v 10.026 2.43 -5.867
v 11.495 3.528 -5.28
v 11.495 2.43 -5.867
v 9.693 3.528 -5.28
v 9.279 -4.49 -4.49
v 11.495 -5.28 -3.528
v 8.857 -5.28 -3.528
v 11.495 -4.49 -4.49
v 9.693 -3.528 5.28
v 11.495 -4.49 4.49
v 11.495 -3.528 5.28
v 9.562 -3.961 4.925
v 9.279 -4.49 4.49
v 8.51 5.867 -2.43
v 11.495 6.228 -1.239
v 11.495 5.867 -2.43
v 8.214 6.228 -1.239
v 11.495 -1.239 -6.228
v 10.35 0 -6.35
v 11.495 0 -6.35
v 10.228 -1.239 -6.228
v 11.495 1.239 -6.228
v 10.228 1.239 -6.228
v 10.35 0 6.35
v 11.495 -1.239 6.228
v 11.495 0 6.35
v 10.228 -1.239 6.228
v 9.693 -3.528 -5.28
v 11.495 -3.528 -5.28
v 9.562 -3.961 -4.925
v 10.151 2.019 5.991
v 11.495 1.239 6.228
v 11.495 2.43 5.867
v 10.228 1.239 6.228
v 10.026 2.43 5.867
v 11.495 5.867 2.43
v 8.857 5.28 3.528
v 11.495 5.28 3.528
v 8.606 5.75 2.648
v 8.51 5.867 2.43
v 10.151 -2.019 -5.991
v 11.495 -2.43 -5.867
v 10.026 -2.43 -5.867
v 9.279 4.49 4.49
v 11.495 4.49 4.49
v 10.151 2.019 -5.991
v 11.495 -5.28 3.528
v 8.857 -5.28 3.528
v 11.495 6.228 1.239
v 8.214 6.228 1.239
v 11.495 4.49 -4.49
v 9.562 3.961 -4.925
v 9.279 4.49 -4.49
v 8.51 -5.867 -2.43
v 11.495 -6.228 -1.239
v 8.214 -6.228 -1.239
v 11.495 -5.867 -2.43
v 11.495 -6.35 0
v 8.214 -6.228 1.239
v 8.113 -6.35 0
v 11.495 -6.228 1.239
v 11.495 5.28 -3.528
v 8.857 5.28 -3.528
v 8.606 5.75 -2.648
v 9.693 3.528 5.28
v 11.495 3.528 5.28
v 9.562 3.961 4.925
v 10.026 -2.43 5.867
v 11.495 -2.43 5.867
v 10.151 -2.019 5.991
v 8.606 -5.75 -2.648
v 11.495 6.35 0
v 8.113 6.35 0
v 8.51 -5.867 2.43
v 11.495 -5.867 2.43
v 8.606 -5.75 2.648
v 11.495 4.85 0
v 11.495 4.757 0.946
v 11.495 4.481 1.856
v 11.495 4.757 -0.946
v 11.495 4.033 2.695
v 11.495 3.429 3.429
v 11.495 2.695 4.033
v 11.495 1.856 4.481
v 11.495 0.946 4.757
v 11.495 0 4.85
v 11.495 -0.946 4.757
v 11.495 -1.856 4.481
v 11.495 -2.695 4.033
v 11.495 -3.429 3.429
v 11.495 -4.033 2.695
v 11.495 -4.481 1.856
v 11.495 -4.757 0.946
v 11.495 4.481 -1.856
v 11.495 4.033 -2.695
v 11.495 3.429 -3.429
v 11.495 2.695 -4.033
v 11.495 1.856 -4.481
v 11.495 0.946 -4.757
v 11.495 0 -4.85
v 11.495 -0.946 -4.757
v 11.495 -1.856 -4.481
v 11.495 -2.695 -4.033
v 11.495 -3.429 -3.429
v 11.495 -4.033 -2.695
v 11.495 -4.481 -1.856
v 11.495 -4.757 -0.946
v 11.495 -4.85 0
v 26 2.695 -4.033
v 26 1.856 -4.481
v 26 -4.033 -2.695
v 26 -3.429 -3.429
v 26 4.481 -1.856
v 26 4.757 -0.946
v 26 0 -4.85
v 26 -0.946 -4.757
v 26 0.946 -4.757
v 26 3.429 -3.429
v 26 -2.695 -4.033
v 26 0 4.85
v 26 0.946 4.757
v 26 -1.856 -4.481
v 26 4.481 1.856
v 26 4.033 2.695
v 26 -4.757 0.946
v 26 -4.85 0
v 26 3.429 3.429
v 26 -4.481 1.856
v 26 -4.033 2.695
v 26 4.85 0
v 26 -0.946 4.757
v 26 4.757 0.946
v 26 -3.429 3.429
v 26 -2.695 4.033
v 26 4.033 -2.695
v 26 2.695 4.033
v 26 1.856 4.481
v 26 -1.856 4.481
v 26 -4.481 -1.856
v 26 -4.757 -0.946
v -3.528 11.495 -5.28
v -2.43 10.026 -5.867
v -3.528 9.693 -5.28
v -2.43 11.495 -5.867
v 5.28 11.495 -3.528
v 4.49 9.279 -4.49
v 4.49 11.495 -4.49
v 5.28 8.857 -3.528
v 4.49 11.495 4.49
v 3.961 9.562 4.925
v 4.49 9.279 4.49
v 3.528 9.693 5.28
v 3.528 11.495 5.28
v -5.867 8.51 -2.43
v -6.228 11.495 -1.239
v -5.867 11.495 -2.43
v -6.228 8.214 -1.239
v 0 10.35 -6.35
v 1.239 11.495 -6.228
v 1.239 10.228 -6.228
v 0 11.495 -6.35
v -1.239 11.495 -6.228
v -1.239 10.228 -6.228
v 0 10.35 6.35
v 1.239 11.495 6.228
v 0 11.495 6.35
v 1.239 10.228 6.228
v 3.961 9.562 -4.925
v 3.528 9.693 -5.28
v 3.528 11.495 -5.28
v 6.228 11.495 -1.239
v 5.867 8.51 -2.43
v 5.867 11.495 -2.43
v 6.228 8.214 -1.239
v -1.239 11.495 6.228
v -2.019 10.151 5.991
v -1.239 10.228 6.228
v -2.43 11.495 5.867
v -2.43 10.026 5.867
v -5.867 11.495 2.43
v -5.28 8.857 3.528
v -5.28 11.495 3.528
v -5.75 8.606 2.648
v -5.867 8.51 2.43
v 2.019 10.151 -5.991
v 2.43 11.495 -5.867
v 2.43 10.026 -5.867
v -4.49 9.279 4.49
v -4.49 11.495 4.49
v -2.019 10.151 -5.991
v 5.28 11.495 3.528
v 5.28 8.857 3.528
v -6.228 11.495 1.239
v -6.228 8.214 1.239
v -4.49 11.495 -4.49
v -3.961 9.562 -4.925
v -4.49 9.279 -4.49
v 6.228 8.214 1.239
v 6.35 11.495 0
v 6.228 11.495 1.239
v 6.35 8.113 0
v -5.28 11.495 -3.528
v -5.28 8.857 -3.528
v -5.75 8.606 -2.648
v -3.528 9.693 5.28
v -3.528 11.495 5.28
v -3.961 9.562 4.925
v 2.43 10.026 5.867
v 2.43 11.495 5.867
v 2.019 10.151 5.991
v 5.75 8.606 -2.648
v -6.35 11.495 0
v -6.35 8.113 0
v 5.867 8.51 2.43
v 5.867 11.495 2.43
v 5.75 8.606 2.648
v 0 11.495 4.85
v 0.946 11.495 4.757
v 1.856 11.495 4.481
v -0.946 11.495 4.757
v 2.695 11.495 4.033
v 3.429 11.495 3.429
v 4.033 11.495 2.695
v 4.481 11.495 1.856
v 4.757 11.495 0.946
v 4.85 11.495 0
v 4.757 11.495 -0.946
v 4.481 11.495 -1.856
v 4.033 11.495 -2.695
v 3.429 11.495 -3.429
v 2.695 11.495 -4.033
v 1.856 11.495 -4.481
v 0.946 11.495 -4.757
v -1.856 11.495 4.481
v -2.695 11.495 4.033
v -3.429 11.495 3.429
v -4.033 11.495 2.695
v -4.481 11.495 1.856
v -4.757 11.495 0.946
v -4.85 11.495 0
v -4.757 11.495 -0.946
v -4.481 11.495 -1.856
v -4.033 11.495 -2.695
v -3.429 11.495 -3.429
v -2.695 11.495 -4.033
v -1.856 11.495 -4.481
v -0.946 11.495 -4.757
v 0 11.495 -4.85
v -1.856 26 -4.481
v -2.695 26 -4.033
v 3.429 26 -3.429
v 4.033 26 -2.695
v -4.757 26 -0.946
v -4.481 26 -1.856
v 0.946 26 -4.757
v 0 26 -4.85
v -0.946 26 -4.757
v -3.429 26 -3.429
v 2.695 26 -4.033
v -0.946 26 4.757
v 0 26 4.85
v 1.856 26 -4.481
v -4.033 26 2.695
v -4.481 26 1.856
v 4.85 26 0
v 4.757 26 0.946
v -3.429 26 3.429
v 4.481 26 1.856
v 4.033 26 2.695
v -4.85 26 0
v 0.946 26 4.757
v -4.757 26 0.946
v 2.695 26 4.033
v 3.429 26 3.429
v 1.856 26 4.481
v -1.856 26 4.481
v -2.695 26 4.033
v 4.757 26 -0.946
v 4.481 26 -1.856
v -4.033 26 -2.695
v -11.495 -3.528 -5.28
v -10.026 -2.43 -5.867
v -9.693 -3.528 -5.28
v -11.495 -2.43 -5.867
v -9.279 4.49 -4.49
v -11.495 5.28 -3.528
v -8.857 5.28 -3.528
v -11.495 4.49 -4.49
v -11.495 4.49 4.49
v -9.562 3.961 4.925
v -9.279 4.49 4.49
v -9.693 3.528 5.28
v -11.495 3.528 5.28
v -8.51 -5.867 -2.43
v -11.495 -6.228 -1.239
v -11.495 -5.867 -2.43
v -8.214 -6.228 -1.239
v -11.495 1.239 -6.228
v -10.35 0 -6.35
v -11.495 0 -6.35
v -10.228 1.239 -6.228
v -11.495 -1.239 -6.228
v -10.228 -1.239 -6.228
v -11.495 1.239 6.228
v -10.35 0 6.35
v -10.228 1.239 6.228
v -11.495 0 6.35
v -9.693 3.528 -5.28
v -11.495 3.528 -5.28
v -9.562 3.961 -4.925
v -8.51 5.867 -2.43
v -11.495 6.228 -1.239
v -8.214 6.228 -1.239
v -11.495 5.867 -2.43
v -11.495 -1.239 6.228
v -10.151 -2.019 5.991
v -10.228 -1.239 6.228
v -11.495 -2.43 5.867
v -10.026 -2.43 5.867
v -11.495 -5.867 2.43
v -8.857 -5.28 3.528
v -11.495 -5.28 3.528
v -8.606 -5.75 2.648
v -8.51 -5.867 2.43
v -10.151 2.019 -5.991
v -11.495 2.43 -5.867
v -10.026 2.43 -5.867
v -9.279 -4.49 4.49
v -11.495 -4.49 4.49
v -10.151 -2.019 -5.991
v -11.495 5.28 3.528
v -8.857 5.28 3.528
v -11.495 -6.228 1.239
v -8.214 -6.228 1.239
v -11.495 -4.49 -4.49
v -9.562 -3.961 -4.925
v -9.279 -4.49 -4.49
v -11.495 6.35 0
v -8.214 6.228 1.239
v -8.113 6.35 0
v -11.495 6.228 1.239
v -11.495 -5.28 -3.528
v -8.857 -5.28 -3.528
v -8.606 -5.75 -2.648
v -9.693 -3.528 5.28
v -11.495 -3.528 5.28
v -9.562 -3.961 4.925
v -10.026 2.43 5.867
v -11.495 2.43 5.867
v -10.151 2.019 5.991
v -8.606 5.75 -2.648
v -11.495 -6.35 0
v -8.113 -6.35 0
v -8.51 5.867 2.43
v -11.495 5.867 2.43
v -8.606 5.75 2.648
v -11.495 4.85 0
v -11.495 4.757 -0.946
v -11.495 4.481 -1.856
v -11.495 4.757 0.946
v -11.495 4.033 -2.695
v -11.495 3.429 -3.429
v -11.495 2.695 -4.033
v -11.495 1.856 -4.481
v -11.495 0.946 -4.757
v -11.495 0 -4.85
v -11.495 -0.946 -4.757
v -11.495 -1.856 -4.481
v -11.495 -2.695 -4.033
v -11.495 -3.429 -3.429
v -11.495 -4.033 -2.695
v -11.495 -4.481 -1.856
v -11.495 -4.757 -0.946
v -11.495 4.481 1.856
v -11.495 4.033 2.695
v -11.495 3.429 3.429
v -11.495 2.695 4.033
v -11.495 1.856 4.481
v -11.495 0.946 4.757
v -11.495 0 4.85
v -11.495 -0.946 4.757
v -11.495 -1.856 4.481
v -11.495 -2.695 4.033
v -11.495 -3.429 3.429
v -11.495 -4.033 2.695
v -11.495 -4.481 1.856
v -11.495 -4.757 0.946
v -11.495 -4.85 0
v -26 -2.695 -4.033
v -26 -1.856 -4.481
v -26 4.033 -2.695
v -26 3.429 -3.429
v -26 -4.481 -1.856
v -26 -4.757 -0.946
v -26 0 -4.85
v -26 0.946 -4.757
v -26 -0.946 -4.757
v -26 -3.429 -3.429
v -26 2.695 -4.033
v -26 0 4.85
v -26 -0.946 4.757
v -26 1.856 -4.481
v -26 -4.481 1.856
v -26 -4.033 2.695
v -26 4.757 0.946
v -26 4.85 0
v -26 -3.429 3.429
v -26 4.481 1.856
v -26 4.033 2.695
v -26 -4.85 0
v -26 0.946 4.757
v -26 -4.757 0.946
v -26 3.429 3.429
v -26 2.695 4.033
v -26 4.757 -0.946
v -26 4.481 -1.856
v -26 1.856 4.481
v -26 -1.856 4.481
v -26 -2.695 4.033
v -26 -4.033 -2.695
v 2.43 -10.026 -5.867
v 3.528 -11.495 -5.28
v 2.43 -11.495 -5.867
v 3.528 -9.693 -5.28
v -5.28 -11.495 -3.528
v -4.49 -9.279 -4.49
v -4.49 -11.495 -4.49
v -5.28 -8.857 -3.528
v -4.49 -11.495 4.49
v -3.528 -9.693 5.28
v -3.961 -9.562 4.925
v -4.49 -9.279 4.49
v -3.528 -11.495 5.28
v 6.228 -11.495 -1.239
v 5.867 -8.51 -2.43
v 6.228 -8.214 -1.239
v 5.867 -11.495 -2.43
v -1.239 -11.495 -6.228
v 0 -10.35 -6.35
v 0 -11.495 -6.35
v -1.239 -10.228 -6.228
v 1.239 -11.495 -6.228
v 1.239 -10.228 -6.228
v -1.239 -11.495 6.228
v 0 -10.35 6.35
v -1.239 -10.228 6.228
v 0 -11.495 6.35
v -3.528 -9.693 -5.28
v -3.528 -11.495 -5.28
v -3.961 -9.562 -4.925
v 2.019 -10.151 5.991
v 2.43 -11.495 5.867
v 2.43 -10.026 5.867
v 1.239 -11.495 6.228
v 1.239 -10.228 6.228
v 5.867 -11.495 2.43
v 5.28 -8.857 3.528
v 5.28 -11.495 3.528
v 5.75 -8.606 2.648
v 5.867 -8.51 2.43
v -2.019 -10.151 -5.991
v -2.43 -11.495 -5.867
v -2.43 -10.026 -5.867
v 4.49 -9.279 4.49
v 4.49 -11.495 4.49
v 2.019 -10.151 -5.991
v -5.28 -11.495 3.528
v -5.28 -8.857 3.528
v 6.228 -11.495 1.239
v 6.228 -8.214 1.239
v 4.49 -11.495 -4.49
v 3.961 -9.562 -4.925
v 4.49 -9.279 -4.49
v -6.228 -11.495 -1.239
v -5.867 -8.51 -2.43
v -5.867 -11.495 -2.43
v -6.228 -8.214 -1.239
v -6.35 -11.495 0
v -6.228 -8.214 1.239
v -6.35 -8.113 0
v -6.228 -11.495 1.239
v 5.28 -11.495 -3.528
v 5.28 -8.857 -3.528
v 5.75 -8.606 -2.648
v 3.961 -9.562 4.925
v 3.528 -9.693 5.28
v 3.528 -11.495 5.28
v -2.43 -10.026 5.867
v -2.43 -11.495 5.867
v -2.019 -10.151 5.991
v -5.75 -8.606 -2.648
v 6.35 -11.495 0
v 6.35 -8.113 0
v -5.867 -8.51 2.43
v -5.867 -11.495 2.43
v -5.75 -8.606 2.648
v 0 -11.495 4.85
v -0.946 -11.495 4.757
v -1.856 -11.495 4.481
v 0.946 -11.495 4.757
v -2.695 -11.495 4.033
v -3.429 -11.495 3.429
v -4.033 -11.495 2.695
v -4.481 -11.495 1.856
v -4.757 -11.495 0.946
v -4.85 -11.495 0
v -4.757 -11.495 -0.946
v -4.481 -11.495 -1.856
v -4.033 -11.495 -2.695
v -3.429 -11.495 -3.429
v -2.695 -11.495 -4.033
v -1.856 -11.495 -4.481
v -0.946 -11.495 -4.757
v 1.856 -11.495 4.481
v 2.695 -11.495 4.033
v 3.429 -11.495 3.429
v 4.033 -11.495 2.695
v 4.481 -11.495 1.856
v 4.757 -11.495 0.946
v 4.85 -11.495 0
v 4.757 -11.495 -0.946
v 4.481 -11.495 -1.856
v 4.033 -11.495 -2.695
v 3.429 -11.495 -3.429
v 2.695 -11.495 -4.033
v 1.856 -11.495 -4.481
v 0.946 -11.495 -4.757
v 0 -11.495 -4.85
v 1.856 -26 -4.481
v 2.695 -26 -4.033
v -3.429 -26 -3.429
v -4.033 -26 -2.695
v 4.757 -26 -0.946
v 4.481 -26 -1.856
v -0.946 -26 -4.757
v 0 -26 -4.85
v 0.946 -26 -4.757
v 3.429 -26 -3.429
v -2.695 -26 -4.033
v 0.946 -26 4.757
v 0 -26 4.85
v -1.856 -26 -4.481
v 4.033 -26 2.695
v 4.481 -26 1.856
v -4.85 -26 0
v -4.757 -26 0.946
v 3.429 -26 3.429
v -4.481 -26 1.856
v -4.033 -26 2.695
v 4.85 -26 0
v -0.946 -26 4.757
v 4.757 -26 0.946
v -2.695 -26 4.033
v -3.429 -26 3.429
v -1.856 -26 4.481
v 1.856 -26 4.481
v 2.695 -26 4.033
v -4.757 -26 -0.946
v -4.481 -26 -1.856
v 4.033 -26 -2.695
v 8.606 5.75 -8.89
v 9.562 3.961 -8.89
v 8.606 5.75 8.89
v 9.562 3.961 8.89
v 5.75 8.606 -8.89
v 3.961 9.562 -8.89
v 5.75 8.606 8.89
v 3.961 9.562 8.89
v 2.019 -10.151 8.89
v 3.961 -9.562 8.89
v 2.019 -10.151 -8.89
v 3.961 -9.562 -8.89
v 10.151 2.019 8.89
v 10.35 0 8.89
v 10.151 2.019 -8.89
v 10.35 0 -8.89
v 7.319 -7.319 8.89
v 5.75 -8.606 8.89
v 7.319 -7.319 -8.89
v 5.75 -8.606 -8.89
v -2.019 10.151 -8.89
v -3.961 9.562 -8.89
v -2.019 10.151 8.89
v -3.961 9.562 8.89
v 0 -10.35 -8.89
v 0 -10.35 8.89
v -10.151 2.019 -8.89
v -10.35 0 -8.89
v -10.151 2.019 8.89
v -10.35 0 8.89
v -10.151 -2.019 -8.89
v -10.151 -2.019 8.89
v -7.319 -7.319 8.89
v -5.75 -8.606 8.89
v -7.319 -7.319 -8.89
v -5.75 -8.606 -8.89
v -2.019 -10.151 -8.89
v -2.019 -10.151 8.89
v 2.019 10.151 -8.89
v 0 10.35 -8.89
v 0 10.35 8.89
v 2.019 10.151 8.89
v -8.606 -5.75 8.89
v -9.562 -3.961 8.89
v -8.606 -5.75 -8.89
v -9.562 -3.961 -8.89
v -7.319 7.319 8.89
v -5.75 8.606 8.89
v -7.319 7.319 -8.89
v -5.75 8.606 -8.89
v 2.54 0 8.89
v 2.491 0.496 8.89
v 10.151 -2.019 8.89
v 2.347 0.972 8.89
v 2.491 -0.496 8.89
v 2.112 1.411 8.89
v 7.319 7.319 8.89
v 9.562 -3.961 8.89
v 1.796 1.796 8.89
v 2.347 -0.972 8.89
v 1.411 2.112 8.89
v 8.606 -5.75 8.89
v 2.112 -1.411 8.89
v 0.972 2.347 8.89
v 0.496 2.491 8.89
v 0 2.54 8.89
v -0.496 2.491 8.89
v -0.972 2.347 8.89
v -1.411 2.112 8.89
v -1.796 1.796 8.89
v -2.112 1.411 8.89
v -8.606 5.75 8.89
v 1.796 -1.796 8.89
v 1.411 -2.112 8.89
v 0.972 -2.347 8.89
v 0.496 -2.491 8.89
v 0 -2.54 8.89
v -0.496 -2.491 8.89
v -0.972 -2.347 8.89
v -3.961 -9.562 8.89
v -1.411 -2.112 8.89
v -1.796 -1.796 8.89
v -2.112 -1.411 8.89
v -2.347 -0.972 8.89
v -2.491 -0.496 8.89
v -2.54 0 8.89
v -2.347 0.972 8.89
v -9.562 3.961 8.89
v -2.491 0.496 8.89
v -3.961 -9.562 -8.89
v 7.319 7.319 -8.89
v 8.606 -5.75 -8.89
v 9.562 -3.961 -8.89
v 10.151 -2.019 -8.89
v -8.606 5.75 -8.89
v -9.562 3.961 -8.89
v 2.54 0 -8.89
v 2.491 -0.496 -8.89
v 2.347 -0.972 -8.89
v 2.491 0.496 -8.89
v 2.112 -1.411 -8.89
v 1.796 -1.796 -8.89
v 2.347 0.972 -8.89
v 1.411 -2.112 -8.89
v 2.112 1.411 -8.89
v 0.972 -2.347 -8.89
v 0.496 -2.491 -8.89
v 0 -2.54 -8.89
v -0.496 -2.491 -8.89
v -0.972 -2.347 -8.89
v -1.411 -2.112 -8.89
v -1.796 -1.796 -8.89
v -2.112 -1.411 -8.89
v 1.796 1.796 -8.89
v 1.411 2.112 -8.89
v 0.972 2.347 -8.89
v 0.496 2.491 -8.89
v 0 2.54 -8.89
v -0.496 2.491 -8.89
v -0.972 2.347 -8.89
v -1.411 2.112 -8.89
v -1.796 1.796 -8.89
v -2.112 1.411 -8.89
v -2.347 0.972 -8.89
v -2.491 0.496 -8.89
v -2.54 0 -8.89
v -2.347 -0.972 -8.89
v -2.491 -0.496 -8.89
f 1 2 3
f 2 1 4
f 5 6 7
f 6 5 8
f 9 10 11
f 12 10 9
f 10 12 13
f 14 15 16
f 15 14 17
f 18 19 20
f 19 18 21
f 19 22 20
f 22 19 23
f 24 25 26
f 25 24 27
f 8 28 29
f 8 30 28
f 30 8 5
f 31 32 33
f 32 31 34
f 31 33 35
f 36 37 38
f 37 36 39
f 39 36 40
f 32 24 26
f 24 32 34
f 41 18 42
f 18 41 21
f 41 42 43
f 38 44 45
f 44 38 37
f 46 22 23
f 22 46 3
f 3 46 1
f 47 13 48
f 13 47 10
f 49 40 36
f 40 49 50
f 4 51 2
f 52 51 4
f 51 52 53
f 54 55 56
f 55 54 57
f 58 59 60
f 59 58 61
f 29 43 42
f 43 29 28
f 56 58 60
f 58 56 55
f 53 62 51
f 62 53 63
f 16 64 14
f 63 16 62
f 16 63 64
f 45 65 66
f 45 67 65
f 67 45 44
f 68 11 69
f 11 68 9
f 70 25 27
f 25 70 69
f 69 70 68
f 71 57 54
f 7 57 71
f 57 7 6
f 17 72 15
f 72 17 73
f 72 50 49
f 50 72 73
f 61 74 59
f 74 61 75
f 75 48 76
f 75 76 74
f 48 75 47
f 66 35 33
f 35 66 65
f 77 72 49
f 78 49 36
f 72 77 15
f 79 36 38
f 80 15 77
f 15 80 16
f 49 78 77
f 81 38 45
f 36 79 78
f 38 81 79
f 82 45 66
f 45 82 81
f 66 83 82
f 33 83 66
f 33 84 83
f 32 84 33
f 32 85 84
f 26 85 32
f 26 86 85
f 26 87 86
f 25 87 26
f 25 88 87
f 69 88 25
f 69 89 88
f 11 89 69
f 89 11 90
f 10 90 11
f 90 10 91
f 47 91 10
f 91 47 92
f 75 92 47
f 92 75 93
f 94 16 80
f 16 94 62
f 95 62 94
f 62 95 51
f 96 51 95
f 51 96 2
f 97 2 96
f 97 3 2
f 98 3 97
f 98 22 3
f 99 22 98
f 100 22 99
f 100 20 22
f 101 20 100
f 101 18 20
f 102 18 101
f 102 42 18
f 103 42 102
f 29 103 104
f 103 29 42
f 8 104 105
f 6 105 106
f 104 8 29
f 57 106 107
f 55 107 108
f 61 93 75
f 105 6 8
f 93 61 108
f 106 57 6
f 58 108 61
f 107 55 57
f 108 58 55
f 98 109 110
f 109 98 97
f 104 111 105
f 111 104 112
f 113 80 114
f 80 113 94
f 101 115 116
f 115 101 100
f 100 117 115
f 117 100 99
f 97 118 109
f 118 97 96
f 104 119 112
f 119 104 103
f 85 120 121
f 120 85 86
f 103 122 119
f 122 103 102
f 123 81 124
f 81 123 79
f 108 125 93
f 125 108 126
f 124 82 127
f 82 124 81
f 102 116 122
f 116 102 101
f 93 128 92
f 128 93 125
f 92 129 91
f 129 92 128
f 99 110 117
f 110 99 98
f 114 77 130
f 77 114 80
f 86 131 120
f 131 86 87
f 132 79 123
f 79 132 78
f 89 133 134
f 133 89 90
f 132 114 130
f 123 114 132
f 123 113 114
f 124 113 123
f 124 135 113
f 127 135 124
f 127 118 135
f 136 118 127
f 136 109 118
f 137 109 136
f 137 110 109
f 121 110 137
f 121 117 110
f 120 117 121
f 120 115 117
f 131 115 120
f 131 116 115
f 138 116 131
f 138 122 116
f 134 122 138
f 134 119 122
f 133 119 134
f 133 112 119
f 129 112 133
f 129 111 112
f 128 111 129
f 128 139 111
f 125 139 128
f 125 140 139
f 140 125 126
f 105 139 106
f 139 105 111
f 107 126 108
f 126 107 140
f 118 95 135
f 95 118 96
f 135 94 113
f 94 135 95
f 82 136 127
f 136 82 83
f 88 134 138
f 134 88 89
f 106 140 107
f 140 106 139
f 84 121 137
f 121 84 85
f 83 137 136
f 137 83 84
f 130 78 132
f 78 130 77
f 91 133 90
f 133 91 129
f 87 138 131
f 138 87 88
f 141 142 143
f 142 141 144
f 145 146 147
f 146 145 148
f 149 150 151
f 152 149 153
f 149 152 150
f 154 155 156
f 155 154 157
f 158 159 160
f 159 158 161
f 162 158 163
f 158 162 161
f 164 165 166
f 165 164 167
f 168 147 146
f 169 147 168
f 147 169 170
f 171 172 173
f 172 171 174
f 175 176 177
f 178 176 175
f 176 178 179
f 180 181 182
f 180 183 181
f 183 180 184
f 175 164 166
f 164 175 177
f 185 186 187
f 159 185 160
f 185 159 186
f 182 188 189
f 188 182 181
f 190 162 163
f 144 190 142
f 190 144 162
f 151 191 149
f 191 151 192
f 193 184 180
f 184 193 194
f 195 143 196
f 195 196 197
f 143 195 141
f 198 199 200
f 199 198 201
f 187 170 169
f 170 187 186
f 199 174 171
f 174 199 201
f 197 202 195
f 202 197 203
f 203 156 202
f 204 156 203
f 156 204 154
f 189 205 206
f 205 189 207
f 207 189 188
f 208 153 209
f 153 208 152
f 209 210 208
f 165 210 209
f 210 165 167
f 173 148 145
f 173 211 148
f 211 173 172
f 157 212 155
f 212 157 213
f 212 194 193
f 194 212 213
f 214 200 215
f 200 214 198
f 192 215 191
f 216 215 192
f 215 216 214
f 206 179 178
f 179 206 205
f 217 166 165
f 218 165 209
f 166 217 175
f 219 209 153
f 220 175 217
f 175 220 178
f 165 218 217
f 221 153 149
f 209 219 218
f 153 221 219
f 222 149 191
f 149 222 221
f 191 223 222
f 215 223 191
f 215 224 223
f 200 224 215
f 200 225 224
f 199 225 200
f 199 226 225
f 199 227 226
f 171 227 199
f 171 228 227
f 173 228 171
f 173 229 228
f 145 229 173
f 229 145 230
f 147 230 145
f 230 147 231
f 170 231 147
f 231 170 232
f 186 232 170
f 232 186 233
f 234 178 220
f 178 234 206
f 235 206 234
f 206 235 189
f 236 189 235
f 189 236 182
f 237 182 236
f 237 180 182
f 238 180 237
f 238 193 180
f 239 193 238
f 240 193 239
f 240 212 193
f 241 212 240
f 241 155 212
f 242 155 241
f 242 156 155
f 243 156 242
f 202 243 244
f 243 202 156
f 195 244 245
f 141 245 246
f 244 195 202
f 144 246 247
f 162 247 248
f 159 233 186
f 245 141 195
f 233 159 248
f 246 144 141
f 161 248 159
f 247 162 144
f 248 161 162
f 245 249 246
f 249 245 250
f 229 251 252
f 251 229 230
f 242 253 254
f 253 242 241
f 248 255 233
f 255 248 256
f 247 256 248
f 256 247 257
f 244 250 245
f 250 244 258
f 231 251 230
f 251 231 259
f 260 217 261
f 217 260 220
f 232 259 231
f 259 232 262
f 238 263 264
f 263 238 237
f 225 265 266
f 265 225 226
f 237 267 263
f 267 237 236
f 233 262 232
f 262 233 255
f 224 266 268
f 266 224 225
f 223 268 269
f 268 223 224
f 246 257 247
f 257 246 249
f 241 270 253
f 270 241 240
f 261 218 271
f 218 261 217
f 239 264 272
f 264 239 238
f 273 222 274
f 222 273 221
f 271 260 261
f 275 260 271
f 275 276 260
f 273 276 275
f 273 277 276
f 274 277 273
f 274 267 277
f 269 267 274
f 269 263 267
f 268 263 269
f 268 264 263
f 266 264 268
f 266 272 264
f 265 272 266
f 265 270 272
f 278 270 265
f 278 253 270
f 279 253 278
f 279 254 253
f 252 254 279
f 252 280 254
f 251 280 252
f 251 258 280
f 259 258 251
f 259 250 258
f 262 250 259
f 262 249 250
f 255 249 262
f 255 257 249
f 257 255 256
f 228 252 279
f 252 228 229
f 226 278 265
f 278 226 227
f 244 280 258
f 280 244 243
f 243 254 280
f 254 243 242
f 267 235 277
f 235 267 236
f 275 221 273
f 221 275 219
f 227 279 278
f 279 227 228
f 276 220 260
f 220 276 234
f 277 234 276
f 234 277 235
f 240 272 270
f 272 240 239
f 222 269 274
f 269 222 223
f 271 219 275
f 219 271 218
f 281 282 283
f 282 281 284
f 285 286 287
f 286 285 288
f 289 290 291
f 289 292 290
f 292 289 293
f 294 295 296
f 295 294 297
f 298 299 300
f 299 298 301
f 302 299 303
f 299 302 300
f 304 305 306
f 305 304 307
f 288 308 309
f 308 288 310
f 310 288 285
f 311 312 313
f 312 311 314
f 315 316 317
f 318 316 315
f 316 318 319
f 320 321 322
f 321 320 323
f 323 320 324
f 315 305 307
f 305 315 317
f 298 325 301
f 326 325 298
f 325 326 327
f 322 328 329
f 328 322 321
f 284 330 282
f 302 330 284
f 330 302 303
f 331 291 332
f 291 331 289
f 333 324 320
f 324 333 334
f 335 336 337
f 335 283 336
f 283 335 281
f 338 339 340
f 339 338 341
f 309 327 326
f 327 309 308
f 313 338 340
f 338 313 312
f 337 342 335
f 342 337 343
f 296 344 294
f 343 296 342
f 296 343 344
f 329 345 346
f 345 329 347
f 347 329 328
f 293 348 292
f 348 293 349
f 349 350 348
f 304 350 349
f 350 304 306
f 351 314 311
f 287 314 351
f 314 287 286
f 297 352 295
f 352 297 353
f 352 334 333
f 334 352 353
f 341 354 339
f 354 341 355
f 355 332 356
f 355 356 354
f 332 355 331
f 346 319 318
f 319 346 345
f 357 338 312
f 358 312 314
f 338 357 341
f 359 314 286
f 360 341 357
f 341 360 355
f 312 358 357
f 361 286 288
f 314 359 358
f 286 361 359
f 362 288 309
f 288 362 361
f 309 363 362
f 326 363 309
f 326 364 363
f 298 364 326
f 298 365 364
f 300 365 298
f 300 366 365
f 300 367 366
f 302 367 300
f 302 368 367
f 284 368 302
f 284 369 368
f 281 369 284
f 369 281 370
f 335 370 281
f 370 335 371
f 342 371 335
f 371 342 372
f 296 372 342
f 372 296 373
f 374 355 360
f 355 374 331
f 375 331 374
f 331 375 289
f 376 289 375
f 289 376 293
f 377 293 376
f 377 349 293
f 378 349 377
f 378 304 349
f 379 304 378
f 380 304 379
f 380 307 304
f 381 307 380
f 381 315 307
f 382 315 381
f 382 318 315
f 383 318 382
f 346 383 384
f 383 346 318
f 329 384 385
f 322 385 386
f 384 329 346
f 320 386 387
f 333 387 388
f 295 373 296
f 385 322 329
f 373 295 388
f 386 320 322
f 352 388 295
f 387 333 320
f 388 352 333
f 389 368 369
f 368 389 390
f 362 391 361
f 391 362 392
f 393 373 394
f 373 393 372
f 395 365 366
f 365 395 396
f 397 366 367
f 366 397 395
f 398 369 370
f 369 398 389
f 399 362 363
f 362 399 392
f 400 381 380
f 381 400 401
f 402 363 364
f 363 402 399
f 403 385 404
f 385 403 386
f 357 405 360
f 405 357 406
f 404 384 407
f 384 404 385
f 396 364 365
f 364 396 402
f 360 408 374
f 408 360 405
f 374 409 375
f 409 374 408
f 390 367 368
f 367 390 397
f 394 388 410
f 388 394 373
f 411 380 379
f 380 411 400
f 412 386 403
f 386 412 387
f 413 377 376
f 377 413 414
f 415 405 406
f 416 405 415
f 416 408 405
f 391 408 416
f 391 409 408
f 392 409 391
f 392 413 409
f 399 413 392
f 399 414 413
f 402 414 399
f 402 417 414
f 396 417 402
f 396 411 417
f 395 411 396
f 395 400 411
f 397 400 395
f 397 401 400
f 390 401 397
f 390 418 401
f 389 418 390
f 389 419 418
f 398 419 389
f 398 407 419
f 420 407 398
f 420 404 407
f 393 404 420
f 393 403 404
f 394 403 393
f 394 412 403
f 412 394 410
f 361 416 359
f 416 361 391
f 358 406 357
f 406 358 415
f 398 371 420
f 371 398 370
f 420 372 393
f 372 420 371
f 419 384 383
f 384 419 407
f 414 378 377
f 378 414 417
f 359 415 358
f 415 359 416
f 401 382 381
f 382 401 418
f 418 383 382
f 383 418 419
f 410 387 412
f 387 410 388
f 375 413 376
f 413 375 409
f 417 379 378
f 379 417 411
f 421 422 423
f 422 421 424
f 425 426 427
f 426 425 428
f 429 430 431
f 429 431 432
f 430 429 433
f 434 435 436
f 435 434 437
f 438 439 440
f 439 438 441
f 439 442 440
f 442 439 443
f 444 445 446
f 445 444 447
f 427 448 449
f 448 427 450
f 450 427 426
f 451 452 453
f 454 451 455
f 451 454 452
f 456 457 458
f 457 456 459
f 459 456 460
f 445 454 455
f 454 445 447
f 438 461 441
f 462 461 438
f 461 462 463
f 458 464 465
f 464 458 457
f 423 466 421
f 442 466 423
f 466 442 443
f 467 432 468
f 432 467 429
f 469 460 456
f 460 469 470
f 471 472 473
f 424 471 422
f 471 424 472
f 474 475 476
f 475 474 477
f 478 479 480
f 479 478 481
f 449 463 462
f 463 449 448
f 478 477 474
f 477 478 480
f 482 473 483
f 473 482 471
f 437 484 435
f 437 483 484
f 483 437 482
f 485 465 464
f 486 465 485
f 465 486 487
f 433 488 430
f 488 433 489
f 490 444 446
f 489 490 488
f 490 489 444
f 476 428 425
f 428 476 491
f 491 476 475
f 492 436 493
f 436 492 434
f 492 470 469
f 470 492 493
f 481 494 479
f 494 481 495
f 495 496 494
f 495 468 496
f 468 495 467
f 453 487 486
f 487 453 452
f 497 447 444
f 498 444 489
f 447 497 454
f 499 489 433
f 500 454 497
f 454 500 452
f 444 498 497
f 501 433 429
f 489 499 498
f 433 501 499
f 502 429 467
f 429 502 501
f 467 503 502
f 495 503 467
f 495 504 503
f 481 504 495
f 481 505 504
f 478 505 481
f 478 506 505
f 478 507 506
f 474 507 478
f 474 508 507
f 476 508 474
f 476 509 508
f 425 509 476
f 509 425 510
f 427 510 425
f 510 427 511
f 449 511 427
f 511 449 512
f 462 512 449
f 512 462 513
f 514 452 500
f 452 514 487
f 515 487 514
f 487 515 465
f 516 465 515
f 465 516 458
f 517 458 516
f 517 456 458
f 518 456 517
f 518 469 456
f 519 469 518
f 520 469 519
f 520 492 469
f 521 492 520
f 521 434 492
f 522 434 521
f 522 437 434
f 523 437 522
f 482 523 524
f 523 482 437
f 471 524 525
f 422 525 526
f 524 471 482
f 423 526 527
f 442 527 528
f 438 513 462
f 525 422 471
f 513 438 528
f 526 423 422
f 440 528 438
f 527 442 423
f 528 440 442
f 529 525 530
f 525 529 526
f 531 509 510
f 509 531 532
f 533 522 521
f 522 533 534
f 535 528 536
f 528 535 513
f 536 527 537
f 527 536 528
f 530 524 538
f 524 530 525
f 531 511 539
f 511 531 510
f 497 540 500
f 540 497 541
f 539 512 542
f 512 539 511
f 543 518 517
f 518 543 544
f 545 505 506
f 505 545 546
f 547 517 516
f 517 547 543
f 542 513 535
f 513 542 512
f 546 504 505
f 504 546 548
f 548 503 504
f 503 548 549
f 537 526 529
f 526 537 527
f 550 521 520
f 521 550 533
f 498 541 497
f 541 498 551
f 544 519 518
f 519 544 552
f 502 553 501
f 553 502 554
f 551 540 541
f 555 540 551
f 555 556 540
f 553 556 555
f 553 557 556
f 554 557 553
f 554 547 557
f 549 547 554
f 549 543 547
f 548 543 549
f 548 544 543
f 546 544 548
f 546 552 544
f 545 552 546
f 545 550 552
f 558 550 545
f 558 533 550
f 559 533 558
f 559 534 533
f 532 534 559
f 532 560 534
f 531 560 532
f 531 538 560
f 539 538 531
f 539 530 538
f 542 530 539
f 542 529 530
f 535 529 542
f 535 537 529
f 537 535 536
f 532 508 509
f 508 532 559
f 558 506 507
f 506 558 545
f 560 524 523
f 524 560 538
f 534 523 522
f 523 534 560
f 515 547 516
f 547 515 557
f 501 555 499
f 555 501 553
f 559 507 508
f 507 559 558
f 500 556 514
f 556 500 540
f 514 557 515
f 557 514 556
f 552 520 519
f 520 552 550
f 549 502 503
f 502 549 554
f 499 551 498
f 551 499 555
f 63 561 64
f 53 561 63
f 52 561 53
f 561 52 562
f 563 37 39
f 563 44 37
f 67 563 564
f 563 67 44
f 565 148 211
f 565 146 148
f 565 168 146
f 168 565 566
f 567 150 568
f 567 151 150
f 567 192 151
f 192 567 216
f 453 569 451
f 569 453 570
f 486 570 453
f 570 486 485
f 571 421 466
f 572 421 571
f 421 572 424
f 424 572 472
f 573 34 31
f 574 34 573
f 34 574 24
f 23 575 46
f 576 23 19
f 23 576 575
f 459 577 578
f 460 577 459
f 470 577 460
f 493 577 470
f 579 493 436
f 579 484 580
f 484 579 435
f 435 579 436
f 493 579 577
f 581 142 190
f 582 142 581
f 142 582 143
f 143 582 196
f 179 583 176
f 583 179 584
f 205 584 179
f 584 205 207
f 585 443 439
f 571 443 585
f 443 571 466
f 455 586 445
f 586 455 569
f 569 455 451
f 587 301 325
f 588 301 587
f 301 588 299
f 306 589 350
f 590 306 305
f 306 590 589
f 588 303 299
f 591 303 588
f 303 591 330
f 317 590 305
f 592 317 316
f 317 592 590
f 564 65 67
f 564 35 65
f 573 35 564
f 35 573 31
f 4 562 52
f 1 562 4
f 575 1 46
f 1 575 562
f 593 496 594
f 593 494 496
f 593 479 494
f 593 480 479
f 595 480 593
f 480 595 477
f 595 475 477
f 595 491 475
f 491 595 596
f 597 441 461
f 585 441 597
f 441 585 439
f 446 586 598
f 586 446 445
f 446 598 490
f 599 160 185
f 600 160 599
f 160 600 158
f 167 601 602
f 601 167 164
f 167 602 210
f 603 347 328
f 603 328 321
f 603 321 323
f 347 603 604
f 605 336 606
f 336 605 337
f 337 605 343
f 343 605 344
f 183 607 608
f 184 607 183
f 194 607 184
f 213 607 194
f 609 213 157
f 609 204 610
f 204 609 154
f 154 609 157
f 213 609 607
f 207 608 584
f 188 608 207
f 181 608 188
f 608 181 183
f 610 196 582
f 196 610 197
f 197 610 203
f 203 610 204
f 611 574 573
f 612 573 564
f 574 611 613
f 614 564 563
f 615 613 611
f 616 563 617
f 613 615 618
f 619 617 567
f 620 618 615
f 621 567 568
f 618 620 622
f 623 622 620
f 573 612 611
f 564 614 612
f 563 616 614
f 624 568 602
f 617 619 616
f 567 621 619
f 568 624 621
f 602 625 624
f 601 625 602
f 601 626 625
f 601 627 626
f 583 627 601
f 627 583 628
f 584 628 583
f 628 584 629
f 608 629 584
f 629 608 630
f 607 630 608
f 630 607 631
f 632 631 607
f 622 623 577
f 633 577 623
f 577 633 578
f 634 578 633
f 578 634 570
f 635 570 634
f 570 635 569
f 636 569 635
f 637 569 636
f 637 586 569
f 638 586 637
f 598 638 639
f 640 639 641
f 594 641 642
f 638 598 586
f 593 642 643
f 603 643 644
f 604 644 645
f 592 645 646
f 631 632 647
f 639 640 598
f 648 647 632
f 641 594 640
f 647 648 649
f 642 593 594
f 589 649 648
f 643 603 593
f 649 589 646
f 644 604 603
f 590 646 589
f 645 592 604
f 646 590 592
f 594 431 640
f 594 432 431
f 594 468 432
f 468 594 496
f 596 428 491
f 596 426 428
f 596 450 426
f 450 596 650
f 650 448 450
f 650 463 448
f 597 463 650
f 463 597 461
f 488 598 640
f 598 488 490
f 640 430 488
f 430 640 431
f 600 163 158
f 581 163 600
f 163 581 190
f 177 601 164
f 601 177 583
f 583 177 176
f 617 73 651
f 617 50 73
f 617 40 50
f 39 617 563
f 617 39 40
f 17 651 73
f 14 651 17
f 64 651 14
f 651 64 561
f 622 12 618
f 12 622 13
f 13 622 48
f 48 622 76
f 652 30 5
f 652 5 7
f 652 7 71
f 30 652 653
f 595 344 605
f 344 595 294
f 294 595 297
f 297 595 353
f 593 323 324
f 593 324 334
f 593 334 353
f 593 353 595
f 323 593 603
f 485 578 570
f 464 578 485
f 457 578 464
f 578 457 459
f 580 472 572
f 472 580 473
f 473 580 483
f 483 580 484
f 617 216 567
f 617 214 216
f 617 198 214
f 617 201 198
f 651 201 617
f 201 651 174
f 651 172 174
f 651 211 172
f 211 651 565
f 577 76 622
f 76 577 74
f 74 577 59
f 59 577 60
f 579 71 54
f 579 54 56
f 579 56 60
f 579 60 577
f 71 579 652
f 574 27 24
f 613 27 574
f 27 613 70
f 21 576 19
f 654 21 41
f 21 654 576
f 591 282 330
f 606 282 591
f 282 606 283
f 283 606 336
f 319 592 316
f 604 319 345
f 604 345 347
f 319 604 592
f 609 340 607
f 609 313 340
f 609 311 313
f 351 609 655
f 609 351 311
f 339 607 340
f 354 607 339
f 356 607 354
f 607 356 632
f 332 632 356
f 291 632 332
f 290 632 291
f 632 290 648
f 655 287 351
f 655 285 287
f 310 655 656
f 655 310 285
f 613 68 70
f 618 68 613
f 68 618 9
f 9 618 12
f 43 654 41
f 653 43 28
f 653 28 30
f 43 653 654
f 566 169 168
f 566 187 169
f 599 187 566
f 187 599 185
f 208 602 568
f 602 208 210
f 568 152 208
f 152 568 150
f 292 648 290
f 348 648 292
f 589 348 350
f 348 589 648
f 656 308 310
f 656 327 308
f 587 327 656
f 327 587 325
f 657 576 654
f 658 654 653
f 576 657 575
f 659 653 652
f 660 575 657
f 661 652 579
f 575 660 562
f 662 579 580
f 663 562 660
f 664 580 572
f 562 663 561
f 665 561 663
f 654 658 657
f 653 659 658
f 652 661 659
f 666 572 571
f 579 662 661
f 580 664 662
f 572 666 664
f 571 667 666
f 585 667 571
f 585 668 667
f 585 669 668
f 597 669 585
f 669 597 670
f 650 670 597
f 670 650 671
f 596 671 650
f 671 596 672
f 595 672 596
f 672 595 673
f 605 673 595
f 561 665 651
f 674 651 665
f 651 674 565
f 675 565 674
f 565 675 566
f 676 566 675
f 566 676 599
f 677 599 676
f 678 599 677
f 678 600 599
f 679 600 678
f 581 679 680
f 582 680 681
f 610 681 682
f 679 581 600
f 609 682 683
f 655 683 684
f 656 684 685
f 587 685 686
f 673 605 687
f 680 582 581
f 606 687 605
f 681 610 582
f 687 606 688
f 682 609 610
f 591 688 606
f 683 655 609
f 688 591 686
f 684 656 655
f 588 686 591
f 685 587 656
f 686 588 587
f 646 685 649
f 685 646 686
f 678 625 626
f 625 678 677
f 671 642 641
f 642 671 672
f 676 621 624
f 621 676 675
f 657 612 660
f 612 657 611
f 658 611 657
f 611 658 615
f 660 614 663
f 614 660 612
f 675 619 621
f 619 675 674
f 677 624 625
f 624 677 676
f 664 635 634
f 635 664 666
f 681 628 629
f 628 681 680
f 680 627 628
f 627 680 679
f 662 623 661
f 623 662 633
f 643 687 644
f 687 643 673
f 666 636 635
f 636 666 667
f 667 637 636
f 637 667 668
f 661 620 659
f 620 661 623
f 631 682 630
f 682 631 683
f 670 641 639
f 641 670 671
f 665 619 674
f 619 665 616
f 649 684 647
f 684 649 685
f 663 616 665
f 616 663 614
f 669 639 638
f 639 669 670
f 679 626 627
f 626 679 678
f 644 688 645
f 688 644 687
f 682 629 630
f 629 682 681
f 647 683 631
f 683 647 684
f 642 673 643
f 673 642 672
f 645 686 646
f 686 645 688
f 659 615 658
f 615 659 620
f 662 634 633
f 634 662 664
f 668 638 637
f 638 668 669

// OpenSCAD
$fn = 32;

// ----------------------------------------------------------------------
// Cardan cross: 52 mm span, 12.7 mm trunnions
// ----------------------------------------------------------------------

// --- parameters (mm) ---
journal_d = 12.7;         // trunnion diameter
arm_len = 26;             // trunnion length from the centre
step_r = 4.32;            // step position from the centre
step_d = 9.7;             // journal diameter after the step
hub_d = 20.7;             // hub diameter
hub_h = 17.78;            // hub height
bore_d = 5.08;            // hub bore

difference() {
  union() {
    /* hub along the joint axis */
    cylinder(h = hub_h, d = hub_d, center = true);
    for (a = [0 : 90 : 270]) rotate([0, 0, a]) {
      /* trunnion, sunk into the hub */
      translate([hub_d / 4, 0, 0]) rotate([0, 90, 0]) cylinder(h = step_r + 2, d = journal_d);
      /* stepped journal out to the tip */
      translate([step_r - 0.5, 0, 0]) rotate([0, 90, 0]) cylinder(h = arm_len + 0.5 - step_r, d = step_d);
    }
  }
  /* lubrication bore through the hub, 2.5 mm clear on both sides */
  translate([0, 0, -hub_h / 2 - 2.5]) cylinder(h = hub_h + 5, d = bore_d);
}
